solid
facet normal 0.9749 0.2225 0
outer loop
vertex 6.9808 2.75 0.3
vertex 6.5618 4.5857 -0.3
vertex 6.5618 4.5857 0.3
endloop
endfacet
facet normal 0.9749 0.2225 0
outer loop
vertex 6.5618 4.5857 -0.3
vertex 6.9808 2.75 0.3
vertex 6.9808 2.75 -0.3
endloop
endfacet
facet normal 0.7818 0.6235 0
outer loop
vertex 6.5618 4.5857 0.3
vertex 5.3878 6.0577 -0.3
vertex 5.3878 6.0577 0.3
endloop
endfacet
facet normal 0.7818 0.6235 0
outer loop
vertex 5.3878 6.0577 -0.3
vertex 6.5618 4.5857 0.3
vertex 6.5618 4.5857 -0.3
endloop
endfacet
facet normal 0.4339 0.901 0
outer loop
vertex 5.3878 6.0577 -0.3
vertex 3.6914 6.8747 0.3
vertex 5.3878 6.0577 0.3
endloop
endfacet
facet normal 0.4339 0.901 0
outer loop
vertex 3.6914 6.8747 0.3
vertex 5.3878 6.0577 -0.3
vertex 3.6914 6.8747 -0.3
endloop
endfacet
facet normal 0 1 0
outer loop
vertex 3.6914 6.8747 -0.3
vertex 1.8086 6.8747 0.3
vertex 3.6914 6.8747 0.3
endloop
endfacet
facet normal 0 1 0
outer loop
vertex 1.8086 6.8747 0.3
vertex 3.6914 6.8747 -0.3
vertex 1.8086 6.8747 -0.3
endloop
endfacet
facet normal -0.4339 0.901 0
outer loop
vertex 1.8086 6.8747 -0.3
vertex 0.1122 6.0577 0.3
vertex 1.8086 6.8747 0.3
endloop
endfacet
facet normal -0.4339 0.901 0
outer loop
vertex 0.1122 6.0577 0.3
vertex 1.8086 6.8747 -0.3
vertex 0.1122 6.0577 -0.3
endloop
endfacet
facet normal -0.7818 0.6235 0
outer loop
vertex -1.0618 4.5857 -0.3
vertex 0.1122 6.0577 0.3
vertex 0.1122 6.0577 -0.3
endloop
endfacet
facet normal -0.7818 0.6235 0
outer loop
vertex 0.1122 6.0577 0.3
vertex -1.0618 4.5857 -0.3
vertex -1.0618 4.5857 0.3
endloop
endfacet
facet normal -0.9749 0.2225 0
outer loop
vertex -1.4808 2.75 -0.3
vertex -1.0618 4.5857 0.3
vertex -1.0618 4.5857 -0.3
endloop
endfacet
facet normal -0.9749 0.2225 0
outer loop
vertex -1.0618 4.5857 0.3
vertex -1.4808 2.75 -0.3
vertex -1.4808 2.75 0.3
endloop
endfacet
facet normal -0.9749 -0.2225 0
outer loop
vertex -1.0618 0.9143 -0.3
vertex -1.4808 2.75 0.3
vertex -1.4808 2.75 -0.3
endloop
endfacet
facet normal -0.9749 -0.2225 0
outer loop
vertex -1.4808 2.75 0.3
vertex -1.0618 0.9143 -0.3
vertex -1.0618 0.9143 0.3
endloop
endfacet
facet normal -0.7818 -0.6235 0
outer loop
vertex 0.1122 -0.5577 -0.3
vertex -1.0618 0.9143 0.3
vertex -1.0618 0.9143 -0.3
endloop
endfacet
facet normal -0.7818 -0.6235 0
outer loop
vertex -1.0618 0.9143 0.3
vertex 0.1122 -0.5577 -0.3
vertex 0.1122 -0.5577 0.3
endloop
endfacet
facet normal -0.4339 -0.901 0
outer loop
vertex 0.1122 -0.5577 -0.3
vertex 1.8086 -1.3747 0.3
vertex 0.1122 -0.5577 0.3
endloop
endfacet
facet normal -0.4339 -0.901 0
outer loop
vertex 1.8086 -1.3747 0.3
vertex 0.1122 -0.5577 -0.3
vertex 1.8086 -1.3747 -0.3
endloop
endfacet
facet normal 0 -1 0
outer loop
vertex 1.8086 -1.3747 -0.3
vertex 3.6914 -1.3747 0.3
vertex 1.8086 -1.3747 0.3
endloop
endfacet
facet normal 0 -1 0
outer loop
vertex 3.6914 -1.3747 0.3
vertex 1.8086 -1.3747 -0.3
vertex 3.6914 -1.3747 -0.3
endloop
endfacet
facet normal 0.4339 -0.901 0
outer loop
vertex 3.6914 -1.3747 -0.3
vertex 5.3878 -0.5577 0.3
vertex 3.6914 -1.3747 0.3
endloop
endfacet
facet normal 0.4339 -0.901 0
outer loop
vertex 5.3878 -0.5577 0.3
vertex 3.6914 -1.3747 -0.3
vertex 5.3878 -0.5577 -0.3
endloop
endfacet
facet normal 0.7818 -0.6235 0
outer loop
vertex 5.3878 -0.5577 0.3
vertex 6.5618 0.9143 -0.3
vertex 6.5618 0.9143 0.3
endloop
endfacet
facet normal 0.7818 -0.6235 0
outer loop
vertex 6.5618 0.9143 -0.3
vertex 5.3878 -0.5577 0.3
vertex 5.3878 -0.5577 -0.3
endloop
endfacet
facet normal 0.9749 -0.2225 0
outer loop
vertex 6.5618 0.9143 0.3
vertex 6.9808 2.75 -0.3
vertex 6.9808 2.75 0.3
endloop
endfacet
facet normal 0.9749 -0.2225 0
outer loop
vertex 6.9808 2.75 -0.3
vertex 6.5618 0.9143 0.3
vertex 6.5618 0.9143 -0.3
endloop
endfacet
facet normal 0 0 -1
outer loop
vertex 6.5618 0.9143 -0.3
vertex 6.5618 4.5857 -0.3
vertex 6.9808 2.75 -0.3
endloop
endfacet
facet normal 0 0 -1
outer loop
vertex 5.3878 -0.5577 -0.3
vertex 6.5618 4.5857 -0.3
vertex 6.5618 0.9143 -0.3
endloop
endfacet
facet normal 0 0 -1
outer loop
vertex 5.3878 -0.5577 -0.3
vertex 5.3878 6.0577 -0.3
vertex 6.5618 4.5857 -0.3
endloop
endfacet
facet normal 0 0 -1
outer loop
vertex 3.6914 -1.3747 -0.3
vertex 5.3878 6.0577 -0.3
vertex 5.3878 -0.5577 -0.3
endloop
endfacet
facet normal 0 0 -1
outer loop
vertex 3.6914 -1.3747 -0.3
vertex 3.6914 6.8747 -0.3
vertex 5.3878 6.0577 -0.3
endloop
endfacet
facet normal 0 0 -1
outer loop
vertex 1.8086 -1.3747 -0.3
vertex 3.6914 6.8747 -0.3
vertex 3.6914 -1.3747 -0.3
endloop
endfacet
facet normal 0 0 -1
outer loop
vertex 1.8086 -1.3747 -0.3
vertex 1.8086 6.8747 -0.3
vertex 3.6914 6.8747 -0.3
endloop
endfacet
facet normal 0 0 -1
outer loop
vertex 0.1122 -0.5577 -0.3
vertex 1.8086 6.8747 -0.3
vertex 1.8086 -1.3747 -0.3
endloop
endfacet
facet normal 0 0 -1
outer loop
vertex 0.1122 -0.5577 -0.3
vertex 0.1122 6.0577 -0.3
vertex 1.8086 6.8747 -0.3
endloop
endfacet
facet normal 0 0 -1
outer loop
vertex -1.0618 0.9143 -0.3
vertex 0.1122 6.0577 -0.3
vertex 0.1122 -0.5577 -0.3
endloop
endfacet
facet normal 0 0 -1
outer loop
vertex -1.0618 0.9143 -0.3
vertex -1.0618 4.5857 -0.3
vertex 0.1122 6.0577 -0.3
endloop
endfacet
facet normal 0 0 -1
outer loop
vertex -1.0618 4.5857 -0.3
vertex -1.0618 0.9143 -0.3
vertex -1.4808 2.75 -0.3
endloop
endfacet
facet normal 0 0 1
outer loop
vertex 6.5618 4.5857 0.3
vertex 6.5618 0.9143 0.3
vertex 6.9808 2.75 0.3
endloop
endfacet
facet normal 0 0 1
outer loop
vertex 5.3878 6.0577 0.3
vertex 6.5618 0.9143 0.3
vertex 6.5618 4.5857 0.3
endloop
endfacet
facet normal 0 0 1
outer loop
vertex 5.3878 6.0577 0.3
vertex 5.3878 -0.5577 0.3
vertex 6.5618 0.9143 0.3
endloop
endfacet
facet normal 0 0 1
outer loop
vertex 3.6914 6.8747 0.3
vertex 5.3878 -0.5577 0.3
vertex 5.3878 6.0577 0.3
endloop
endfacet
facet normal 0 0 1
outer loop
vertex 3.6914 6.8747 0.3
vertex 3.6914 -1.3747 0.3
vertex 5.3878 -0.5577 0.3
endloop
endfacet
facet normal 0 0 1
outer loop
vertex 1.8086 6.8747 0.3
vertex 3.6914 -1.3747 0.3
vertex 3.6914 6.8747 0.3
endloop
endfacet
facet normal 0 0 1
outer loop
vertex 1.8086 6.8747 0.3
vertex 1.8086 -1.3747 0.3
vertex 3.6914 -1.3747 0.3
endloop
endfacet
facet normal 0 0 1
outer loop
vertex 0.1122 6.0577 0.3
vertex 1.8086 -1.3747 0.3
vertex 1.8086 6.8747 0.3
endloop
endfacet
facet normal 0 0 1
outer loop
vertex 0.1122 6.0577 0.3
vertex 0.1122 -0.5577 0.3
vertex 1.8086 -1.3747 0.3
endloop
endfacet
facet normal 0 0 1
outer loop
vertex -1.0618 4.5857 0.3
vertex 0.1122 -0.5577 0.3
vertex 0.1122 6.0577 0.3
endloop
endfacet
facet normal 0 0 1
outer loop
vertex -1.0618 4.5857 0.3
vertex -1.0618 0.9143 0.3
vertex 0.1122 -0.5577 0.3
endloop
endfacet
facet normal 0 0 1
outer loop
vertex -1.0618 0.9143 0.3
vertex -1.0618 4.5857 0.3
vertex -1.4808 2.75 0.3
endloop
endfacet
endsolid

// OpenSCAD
rotate([0,0,0])difference()translate([2.75,2.75,0])  cylinder(r=4.23076923076923,h=0.6, center=true);
